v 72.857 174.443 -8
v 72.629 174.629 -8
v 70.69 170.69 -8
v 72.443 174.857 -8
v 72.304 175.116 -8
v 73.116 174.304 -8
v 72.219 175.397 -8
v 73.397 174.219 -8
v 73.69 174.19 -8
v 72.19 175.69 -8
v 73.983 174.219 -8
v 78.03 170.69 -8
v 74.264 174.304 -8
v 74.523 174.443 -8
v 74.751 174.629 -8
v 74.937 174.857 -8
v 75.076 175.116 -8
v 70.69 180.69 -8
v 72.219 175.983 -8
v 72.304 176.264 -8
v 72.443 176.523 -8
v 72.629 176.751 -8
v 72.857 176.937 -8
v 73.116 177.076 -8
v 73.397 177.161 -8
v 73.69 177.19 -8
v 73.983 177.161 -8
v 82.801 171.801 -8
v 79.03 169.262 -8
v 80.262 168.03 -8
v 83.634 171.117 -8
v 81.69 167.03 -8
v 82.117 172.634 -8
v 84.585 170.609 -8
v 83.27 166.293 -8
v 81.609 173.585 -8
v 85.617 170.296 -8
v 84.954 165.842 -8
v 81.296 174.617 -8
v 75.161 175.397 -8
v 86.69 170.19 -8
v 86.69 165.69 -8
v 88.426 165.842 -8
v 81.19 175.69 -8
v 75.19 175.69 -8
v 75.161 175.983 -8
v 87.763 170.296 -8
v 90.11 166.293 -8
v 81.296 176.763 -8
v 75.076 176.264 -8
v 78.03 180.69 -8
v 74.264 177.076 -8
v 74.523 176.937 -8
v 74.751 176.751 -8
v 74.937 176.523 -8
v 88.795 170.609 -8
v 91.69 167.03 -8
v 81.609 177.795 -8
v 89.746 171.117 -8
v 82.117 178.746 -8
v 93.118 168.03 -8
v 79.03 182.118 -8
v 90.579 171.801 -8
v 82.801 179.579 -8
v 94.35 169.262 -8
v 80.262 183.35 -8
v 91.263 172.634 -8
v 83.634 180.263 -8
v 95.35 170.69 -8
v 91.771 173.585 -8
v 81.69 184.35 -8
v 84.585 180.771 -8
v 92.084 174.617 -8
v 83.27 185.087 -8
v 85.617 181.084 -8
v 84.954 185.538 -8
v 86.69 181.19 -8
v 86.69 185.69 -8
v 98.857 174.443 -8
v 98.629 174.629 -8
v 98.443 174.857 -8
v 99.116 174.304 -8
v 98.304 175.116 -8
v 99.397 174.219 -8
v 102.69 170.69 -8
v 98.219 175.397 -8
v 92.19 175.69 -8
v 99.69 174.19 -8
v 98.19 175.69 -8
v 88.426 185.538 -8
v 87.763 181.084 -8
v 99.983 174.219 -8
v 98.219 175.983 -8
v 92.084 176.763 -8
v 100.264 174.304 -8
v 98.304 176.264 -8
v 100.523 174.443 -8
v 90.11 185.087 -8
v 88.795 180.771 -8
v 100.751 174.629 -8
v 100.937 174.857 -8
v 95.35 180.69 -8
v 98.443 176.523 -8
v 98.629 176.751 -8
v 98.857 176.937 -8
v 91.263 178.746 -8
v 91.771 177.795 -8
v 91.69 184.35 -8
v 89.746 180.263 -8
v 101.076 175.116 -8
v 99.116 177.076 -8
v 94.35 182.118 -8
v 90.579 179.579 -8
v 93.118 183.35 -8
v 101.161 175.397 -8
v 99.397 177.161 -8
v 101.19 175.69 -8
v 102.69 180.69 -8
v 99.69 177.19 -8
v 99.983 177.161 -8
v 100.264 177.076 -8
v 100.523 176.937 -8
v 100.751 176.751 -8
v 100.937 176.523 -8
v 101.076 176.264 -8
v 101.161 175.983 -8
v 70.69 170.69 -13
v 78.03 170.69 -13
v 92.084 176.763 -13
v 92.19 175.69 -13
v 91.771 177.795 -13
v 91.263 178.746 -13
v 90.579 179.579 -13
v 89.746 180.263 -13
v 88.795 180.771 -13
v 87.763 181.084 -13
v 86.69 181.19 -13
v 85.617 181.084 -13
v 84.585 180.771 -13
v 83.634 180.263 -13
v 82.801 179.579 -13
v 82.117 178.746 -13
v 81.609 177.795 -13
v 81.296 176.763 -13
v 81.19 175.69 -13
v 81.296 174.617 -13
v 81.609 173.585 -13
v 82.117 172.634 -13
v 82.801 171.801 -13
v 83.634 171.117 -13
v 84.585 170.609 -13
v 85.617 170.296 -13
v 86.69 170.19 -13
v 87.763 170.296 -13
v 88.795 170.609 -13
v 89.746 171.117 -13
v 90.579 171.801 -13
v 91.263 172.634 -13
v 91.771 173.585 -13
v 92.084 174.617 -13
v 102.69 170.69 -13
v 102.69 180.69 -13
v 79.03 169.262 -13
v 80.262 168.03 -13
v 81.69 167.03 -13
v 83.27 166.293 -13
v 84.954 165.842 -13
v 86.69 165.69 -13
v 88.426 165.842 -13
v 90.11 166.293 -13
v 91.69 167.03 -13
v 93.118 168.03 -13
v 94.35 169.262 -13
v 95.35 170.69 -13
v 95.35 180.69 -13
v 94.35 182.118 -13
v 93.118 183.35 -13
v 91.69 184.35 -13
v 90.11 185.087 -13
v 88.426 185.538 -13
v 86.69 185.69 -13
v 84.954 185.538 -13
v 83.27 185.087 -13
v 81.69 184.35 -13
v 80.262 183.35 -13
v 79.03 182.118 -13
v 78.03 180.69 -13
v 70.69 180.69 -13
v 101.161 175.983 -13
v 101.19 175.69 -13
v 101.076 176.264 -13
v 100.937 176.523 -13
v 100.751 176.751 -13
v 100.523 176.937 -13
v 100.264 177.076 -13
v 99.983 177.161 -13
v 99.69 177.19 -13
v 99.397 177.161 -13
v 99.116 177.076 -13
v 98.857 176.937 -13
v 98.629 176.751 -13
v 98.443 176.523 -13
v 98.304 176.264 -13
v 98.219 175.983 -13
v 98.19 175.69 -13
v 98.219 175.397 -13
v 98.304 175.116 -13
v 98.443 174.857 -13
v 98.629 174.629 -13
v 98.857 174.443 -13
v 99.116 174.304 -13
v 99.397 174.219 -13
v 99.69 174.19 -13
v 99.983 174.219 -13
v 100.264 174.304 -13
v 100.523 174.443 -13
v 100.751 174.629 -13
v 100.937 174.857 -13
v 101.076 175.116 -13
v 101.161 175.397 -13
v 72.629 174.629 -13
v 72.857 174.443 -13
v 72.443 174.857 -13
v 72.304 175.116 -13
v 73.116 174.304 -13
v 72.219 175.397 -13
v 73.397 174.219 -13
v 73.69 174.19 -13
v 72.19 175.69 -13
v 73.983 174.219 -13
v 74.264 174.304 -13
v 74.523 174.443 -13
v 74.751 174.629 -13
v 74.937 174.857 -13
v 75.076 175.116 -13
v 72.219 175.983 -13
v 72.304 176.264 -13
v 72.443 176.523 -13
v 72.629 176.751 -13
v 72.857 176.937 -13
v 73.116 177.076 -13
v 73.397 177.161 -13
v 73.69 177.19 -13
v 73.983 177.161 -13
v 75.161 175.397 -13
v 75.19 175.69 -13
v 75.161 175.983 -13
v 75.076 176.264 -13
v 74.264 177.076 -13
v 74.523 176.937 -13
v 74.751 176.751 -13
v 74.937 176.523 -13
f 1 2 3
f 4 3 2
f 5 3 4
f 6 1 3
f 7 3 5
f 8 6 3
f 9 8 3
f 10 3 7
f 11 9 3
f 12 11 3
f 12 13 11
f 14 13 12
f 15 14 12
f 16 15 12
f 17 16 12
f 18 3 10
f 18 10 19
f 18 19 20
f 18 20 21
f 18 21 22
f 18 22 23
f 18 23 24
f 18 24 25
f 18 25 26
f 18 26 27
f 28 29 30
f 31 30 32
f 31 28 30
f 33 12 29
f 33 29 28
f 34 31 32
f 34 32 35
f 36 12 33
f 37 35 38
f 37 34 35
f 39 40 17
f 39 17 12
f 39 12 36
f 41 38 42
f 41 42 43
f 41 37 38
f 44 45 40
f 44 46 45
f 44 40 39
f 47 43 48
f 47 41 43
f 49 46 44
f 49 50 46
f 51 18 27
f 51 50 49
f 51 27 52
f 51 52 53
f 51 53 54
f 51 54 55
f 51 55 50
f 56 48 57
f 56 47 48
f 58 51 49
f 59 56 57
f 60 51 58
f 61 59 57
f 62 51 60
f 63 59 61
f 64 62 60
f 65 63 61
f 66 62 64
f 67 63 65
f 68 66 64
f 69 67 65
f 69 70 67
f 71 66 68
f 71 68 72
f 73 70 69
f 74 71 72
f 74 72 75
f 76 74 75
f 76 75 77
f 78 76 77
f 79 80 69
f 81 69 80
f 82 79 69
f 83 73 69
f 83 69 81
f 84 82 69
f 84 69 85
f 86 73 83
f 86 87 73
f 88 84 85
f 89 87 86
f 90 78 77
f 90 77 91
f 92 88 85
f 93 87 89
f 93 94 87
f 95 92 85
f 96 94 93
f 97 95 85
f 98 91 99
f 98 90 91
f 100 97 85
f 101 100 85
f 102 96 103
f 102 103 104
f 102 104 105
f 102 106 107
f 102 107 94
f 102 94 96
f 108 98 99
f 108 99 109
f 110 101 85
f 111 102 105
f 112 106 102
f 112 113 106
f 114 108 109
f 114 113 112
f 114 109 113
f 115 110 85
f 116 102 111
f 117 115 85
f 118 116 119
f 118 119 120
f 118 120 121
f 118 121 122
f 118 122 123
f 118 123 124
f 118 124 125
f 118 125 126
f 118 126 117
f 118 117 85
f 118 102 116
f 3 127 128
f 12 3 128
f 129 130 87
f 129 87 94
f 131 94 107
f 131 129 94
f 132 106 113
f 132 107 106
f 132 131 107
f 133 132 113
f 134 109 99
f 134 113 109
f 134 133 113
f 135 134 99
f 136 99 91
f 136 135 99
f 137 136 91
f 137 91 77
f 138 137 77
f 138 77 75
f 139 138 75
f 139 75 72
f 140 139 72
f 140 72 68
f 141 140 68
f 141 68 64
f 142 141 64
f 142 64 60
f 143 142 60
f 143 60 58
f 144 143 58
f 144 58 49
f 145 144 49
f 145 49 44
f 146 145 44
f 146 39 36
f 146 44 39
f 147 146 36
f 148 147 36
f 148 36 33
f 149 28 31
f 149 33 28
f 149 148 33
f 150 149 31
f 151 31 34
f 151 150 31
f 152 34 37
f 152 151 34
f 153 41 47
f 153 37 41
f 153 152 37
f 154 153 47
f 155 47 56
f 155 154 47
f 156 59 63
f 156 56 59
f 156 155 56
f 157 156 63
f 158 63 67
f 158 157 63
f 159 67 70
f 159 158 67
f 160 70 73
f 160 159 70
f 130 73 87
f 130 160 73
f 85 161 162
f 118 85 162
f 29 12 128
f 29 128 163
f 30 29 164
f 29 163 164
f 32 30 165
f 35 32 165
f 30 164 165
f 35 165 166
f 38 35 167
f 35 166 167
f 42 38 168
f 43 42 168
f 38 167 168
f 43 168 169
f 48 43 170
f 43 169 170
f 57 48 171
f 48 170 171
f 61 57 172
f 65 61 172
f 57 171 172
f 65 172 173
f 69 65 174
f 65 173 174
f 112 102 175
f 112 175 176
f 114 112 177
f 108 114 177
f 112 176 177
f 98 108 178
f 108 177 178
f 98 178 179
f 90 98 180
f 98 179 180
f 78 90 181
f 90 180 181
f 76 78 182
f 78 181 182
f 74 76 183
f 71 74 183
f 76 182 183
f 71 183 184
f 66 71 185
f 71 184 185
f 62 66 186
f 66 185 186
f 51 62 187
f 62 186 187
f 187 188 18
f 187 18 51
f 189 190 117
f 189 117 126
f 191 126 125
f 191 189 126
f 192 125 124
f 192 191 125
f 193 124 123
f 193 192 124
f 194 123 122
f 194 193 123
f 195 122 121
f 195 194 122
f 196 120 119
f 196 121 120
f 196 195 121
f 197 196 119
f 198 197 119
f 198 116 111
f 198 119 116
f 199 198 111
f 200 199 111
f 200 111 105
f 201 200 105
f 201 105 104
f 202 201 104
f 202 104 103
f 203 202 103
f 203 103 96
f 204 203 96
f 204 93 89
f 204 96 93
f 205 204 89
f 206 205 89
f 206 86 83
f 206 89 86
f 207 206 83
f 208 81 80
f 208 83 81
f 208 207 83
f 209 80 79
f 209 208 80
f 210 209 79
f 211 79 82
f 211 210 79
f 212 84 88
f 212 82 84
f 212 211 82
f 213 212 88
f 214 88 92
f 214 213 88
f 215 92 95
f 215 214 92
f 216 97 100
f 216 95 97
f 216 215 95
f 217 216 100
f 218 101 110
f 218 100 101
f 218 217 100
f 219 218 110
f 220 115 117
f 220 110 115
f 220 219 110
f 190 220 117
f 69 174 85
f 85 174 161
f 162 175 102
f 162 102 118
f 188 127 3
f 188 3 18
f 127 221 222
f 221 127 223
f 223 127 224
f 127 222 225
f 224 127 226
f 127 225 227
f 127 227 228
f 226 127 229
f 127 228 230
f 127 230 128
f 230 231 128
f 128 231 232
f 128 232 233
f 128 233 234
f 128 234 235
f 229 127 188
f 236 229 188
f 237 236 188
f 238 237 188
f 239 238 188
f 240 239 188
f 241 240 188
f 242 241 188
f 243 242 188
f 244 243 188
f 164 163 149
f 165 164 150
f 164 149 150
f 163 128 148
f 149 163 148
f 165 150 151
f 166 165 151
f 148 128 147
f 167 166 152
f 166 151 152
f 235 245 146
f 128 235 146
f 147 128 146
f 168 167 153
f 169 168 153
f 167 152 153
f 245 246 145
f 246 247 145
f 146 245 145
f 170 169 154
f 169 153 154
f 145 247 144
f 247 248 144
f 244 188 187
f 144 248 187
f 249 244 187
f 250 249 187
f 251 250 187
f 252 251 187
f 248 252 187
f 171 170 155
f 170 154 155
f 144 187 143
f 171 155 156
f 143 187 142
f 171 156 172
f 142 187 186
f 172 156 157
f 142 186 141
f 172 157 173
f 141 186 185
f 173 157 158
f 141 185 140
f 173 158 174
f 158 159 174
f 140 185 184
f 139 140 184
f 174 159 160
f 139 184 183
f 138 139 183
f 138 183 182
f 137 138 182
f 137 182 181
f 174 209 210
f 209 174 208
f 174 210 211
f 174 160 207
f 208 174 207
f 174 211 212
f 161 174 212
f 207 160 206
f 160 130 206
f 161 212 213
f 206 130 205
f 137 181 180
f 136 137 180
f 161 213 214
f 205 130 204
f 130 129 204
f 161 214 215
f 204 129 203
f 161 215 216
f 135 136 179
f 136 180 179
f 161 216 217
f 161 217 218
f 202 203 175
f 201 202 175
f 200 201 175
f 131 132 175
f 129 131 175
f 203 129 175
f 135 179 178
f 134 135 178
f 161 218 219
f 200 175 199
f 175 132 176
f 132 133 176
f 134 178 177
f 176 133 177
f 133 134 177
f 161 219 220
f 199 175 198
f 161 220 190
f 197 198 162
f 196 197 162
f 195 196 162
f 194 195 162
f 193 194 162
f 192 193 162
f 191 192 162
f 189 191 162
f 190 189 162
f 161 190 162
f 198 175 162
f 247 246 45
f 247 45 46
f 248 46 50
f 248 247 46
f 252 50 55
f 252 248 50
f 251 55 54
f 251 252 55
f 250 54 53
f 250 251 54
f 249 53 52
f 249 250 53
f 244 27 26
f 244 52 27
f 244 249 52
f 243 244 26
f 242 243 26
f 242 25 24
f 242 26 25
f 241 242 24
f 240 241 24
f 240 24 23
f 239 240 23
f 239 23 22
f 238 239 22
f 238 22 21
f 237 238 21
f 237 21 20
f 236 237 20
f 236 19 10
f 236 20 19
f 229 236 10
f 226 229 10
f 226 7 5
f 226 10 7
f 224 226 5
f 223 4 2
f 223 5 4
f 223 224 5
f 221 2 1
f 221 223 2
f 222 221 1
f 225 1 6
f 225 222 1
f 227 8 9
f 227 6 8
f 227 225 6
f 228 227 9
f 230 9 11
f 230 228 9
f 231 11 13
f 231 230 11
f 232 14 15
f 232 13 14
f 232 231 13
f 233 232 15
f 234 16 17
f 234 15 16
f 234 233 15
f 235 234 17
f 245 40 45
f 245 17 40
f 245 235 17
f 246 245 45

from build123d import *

# Parameters (mm, degrees)
CYLINDER115_R     = 1.5
CYLINDER115_DEPTH = 11
CYLINDER113_R     = 5.5
CYLINDER113_DEPTH = 46
CYLINDER114_R     = 1.5
CYLINDER114_DEPTH = 11
BOX019_W          = 32
BOX019_H          = 10
BOX019_DEPTH      = 5
CYLINDER112_R     = 10
CYLINDER112_DEPTH = 5
CYLINDER111_R     = 7
CYLINDER111_DEPTH = 5


with BuildPart() as ftthreaded008:
    # Cylinder115 → Cylinder115 (new body)
    with BuildSketch(Plane(origin=(99.69, 175.69, -10), x_dir=(1, 0, 0), z_dir=(0, 0, 1))):
        Circle(CYLINDER115_R)
    extrude(amount=CYLINDER115_DEPTH)


with BuildPart() as rffeeds009:
    # Cylinder113 → Cylinder113 (new body)
    with BuildSketch(Plane(origin=(86.69, 175.69, -14), x_dir=(1, 0, 0), z_dir=(0, 0, 1))):
        Circle(CYLINDER113_R)
    extrude(amount=CYLINDER113_DEPTH)


with BuildPart() as fusion049:
    # Cylinder114 → Cylinder114 (new body)
    with BuildSketch(Plane(origin=(73.69, 175.69, -10), x_dir=(1, 0, 0), z_dir=(0, 0, 1))):
        Circle(CYLINDER114_R)
    extrude(amount=CYLINDER114_DEPTH)

    # Fusion049: union FTThreaded008, RFFeeds009
    add(ftthreaded008.part)
    add(rffeeds009.part)


with BuildPart() as rffeedlug001:
    # Box019 → Box019 (new body)
    with BuildSketch(Plane(origin=(70.69, 170.69, -5), x_dir=(1, 0, 0), z_dir=(0, 0, 1))):
        with Locations((16, 5)):
            Rectangle(BOX019_W, BOX019_H)
    extrude(amount=BOX019_DEPTH)


with BuildPart() as rffeeds008:
    # Cylinder112 → Cylinder112 (new body)
    with BuildSketch(Plane(origin=(86.69, 175.69, -5), x_dir=(1, 0, 0), z_dir=(0, 0, 1))):
        Circle(CYLINDER112_R)
    extrude(amount=CYLINDER112_DEPTH)


with BuildPart() as rfftbackplate:
    # Cylinder111 → Cylinder111 (new body)
    with BuildSketch(Plane(origin=(86.69, 175.69, -5), x_dir=(1, 0, 0), z_dir=(0, 0, 1))):
        Circle(CYLINDER111_R)
    extrude(amount=CYLINDER111_DEPTH)

    # Fusion048: union RFFeedLug001, RFFeeds008
    add(rffeedlug001.part)
    add(rffeeds008.part)

    # Cut014: cut Fusion049
    add(fusion049.part, mode=Mode.SUBTRACT)


with BuildPart() as rfftbackplate_1:
    # Cut014 placement: moved
    add(rfftbackplate.part.moved(Location((0, 0, -8))))


solid = rfftbackplate_1.part
